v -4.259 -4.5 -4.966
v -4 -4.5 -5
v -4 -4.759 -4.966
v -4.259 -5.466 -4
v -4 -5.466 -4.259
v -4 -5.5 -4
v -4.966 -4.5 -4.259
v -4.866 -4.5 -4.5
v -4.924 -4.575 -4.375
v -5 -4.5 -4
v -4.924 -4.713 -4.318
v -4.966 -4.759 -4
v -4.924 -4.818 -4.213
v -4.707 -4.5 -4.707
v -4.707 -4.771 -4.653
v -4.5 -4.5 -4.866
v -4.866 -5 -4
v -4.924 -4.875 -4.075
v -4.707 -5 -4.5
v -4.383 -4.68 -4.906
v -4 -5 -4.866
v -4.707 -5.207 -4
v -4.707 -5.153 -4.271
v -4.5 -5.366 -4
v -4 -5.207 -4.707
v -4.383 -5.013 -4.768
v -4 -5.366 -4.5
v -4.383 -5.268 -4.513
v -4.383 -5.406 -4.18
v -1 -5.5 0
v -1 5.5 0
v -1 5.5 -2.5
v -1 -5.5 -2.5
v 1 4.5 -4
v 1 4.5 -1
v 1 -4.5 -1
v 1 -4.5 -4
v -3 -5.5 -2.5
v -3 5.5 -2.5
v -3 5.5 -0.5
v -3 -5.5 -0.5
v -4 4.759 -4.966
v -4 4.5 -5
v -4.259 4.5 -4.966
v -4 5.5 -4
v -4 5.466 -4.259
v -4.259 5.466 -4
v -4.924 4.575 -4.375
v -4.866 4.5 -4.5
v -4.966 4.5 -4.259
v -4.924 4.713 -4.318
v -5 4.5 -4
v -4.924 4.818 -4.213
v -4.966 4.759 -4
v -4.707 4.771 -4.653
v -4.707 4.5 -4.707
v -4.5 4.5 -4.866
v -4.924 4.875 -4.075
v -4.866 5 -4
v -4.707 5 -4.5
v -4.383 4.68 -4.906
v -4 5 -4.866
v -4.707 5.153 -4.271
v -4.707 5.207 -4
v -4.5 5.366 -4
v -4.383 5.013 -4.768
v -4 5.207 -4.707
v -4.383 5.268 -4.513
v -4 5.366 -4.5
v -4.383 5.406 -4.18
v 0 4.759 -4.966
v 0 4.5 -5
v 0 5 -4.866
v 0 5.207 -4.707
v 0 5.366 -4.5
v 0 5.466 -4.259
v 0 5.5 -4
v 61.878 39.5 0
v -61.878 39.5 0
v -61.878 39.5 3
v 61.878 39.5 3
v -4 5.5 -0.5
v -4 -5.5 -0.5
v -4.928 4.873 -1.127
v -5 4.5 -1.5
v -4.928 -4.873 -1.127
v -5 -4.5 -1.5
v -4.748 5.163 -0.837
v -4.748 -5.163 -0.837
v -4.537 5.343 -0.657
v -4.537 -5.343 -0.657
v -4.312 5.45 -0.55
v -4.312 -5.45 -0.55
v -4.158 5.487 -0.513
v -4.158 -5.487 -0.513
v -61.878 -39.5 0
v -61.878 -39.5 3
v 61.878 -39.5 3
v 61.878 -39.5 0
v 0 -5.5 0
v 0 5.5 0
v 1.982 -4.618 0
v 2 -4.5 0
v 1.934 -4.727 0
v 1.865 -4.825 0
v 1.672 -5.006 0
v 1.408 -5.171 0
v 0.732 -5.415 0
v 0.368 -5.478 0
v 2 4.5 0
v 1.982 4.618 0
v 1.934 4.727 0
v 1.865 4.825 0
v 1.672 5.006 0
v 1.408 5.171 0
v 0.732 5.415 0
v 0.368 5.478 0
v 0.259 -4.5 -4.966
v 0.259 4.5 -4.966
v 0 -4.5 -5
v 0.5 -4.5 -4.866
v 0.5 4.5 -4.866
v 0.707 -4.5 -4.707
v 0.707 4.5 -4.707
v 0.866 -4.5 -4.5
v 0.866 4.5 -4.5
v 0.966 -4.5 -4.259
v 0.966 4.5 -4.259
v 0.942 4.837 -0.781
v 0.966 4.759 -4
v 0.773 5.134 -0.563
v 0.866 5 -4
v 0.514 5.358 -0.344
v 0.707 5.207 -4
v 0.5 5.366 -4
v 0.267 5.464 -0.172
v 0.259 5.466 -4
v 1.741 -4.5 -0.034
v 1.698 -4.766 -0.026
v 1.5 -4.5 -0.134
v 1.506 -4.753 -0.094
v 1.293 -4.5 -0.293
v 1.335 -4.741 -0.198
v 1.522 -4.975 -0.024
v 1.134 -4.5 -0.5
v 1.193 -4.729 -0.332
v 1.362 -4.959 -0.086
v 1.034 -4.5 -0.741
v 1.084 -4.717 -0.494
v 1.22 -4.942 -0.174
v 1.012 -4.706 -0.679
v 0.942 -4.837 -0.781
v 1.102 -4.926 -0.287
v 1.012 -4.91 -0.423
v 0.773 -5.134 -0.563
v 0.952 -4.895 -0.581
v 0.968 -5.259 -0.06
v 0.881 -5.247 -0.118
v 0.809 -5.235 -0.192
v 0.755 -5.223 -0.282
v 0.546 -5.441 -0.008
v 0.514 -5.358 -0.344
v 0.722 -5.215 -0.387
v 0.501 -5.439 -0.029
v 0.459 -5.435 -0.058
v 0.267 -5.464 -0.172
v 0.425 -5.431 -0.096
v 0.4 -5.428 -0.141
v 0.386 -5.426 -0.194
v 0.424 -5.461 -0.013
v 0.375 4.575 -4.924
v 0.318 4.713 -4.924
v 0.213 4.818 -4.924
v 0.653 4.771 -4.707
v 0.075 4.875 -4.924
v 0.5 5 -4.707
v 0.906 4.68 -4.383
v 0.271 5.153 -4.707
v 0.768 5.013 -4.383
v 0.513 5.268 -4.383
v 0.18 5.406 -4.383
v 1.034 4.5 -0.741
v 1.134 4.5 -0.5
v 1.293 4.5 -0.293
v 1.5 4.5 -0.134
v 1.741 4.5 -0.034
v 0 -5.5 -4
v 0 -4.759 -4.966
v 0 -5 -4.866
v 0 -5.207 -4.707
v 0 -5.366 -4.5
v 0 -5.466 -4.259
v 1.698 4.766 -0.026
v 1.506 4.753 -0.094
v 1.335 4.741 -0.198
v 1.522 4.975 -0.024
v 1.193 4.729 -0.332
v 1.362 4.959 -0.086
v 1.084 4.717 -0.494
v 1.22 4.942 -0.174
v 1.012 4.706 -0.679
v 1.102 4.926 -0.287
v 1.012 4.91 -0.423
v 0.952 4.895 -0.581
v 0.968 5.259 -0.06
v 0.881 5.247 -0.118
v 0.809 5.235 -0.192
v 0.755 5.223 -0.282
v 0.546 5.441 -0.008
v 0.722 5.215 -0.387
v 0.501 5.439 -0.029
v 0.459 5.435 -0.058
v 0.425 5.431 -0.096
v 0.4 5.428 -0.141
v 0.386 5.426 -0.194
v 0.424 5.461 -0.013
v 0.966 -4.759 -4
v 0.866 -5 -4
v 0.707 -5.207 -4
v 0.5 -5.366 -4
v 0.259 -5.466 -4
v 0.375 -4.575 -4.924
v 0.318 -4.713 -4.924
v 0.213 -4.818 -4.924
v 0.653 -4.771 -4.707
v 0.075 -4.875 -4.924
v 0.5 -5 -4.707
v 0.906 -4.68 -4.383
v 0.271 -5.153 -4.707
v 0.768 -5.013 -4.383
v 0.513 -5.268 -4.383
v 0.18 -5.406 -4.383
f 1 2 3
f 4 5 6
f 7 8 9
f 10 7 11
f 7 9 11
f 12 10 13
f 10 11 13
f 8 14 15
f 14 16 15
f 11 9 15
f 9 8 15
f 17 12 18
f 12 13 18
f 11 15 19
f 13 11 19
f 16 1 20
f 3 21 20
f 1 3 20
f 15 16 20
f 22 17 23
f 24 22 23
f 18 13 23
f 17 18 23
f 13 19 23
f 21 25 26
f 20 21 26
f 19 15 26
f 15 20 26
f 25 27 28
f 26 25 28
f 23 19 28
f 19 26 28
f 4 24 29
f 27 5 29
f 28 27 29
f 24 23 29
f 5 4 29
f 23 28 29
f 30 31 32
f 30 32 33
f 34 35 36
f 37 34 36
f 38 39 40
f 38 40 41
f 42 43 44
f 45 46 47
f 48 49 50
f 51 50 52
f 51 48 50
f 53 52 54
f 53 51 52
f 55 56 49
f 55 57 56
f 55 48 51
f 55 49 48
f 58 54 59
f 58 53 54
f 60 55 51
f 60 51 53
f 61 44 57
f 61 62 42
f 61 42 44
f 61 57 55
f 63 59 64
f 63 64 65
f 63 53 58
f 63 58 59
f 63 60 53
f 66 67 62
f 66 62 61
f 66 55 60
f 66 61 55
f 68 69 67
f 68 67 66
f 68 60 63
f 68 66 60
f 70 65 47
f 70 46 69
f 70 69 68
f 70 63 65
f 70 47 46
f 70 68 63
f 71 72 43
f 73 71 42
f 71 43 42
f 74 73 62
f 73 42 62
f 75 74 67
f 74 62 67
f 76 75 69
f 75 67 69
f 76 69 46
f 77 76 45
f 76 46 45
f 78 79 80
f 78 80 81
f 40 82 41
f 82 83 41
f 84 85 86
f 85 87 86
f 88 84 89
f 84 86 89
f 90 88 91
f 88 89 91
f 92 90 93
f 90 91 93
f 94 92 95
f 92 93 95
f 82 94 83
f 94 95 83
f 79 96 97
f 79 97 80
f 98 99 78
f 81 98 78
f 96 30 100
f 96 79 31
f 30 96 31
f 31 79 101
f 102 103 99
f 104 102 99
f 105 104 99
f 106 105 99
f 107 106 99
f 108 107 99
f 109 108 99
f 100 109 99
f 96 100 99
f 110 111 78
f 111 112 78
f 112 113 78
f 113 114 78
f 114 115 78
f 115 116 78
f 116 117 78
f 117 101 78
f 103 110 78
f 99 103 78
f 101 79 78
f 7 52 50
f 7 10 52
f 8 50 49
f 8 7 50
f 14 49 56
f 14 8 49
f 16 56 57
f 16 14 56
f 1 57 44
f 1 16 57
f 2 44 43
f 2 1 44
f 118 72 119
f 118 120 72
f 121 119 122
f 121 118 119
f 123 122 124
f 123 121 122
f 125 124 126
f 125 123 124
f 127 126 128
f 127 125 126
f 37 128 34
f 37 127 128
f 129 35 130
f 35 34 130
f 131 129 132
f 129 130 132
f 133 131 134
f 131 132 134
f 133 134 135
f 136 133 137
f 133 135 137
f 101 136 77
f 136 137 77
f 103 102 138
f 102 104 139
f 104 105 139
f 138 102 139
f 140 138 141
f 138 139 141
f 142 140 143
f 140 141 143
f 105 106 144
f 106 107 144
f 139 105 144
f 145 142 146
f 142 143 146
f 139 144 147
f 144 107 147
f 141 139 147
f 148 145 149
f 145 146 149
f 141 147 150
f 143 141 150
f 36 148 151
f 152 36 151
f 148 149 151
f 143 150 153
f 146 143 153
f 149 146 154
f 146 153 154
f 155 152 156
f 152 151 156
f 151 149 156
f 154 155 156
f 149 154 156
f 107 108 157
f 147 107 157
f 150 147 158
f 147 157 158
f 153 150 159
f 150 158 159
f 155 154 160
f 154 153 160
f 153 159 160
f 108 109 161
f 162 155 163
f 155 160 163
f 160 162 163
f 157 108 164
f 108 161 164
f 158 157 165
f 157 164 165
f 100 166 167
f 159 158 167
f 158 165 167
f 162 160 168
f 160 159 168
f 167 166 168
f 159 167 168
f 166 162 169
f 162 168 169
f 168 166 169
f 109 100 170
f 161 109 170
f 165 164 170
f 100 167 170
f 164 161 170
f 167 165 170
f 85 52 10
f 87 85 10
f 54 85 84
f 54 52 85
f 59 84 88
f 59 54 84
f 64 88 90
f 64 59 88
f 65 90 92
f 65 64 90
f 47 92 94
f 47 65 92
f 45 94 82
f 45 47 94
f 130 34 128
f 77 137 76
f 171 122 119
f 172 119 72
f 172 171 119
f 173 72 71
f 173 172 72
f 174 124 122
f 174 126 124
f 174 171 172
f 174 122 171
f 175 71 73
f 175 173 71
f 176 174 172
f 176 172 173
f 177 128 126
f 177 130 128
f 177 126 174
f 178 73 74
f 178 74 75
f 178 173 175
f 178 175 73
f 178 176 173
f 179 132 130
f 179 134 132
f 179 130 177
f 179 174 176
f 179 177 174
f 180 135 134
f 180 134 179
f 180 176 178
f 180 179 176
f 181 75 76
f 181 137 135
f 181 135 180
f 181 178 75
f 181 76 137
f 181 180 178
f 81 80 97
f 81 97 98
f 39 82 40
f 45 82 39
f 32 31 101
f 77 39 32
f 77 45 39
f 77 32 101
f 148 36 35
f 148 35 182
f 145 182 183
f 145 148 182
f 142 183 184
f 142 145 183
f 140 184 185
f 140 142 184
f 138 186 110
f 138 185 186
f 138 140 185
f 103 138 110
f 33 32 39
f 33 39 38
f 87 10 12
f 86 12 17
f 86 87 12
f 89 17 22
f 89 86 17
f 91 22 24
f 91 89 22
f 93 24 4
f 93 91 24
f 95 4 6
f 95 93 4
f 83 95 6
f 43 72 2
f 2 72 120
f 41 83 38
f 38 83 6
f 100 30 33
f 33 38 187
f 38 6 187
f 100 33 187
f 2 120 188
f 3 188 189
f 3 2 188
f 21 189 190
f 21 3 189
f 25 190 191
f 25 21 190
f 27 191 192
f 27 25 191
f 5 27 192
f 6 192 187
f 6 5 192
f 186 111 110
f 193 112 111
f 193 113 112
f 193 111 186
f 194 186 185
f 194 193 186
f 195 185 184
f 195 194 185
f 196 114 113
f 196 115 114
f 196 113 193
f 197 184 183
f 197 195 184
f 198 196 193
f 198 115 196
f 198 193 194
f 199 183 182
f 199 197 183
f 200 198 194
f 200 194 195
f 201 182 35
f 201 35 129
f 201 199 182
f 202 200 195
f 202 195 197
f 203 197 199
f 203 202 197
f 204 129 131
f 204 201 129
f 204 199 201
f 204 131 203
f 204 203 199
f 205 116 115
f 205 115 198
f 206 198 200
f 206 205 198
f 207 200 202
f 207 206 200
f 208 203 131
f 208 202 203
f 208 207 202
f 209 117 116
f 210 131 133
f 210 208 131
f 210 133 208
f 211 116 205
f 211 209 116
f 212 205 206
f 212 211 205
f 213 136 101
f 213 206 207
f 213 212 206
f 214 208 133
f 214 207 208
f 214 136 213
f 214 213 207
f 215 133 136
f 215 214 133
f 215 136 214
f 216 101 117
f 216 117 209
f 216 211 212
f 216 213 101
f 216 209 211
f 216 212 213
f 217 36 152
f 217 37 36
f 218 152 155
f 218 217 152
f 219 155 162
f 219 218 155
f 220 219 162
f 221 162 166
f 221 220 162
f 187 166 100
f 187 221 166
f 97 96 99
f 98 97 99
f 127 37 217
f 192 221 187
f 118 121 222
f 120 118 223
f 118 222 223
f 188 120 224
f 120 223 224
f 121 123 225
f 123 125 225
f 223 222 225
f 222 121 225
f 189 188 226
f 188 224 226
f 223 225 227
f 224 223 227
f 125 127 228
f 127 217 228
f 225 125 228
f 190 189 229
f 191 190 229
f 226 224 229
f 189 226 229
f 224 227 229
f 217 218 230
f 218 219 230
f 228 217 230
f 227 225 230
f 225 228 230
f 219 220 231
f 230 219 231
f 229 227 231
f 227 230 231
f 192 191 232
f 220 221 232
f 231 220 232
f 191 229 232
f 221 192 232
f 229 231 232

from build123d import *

# Parameters (mm, degrees)
SKETCH_W     = 123.756
SKETCH_H     = 79
PAD_DEPTH    = 3
SKETCH001_W  = 2
SKETCH001_H  = 11
PAD001_DEPTH = 5
SKETCH002_W  = 11
SKETCH002_H  = 2.5
PAD002_DEPTH = 4
SKETCH003_W  = 2
SKETCH003_H  = 11
PAD003_DEPTH = 2
FILLET_R     = 1


with BuildPart() as part:
    # Sketch → Pad (new body)
    with BuildSketch(Plane.XY):
        Rectangle(SKETCH_W, SKETCH_H)
    extrude(amount=PAD_DEPTH)

    # Sketch001 (on Face5 of Pad) → Pad001 (join)
    with BuildSketch(Plane(origin=(0, 0, 0), x_dir=(1, 0, 0), z_dir=(0, 0, -1))):
        Rectangle(SKETCH001_W, SKETCH001_H)
    extrude(amount=PAD001_DEPTH)

    # Sketch002 (on Face7 of Pad001) → Pad002 (join)
    with BuildSketch(Plane(origin=(-1, 0, 0), x_dir=(0, -1, 0), z_dir=(-1, 0, 0))):
        with Locations((0, -3.75)):
            Rectangle(SKETCH002_W, SKETCH002_H)
    extrude(amount=PAD002_DEPTH)

    # Sketch003 (on Face16 of Pad002) → Pad003 (join)
    with BuildSketch(Plane(origin=(0, 0, -2.5), x_dir=(1, 0, 0), z_dir=(0, 0, -1))):
        with Locations((-4, 0)):
            Rectangle(SKETCH003_W, SKETCH003_H)
    extrude(amount=-PAD003_DEPTH)

    # Fillet
    fillet_edges = [part.edges().sort_by_distance(p)[0] for p in [
        (1, -5.5, -2.5),
        (1, 5.5, -2.5),
        (1, 0, 0),
        (1, 0, -5),
        (0, -5.5, -5),
        (0, 5.5, -5),
        (-1, 0, -5),
        (-3, -5.5, -5),
        (-3, 5.5, -5),
        (-5, 0, -5),
        (-5, 0, -2.5),
        (-5, -5.5, -3.75),
        (-5, 5.5, -3.75),
        (-5, 5.5, -1.5),
        (-5, -5.5, -1.5),
        (-5, 0, -0.5),
    ]]
    fillet(fillet_edges, radius=FILLET_R)


solid = part.part
